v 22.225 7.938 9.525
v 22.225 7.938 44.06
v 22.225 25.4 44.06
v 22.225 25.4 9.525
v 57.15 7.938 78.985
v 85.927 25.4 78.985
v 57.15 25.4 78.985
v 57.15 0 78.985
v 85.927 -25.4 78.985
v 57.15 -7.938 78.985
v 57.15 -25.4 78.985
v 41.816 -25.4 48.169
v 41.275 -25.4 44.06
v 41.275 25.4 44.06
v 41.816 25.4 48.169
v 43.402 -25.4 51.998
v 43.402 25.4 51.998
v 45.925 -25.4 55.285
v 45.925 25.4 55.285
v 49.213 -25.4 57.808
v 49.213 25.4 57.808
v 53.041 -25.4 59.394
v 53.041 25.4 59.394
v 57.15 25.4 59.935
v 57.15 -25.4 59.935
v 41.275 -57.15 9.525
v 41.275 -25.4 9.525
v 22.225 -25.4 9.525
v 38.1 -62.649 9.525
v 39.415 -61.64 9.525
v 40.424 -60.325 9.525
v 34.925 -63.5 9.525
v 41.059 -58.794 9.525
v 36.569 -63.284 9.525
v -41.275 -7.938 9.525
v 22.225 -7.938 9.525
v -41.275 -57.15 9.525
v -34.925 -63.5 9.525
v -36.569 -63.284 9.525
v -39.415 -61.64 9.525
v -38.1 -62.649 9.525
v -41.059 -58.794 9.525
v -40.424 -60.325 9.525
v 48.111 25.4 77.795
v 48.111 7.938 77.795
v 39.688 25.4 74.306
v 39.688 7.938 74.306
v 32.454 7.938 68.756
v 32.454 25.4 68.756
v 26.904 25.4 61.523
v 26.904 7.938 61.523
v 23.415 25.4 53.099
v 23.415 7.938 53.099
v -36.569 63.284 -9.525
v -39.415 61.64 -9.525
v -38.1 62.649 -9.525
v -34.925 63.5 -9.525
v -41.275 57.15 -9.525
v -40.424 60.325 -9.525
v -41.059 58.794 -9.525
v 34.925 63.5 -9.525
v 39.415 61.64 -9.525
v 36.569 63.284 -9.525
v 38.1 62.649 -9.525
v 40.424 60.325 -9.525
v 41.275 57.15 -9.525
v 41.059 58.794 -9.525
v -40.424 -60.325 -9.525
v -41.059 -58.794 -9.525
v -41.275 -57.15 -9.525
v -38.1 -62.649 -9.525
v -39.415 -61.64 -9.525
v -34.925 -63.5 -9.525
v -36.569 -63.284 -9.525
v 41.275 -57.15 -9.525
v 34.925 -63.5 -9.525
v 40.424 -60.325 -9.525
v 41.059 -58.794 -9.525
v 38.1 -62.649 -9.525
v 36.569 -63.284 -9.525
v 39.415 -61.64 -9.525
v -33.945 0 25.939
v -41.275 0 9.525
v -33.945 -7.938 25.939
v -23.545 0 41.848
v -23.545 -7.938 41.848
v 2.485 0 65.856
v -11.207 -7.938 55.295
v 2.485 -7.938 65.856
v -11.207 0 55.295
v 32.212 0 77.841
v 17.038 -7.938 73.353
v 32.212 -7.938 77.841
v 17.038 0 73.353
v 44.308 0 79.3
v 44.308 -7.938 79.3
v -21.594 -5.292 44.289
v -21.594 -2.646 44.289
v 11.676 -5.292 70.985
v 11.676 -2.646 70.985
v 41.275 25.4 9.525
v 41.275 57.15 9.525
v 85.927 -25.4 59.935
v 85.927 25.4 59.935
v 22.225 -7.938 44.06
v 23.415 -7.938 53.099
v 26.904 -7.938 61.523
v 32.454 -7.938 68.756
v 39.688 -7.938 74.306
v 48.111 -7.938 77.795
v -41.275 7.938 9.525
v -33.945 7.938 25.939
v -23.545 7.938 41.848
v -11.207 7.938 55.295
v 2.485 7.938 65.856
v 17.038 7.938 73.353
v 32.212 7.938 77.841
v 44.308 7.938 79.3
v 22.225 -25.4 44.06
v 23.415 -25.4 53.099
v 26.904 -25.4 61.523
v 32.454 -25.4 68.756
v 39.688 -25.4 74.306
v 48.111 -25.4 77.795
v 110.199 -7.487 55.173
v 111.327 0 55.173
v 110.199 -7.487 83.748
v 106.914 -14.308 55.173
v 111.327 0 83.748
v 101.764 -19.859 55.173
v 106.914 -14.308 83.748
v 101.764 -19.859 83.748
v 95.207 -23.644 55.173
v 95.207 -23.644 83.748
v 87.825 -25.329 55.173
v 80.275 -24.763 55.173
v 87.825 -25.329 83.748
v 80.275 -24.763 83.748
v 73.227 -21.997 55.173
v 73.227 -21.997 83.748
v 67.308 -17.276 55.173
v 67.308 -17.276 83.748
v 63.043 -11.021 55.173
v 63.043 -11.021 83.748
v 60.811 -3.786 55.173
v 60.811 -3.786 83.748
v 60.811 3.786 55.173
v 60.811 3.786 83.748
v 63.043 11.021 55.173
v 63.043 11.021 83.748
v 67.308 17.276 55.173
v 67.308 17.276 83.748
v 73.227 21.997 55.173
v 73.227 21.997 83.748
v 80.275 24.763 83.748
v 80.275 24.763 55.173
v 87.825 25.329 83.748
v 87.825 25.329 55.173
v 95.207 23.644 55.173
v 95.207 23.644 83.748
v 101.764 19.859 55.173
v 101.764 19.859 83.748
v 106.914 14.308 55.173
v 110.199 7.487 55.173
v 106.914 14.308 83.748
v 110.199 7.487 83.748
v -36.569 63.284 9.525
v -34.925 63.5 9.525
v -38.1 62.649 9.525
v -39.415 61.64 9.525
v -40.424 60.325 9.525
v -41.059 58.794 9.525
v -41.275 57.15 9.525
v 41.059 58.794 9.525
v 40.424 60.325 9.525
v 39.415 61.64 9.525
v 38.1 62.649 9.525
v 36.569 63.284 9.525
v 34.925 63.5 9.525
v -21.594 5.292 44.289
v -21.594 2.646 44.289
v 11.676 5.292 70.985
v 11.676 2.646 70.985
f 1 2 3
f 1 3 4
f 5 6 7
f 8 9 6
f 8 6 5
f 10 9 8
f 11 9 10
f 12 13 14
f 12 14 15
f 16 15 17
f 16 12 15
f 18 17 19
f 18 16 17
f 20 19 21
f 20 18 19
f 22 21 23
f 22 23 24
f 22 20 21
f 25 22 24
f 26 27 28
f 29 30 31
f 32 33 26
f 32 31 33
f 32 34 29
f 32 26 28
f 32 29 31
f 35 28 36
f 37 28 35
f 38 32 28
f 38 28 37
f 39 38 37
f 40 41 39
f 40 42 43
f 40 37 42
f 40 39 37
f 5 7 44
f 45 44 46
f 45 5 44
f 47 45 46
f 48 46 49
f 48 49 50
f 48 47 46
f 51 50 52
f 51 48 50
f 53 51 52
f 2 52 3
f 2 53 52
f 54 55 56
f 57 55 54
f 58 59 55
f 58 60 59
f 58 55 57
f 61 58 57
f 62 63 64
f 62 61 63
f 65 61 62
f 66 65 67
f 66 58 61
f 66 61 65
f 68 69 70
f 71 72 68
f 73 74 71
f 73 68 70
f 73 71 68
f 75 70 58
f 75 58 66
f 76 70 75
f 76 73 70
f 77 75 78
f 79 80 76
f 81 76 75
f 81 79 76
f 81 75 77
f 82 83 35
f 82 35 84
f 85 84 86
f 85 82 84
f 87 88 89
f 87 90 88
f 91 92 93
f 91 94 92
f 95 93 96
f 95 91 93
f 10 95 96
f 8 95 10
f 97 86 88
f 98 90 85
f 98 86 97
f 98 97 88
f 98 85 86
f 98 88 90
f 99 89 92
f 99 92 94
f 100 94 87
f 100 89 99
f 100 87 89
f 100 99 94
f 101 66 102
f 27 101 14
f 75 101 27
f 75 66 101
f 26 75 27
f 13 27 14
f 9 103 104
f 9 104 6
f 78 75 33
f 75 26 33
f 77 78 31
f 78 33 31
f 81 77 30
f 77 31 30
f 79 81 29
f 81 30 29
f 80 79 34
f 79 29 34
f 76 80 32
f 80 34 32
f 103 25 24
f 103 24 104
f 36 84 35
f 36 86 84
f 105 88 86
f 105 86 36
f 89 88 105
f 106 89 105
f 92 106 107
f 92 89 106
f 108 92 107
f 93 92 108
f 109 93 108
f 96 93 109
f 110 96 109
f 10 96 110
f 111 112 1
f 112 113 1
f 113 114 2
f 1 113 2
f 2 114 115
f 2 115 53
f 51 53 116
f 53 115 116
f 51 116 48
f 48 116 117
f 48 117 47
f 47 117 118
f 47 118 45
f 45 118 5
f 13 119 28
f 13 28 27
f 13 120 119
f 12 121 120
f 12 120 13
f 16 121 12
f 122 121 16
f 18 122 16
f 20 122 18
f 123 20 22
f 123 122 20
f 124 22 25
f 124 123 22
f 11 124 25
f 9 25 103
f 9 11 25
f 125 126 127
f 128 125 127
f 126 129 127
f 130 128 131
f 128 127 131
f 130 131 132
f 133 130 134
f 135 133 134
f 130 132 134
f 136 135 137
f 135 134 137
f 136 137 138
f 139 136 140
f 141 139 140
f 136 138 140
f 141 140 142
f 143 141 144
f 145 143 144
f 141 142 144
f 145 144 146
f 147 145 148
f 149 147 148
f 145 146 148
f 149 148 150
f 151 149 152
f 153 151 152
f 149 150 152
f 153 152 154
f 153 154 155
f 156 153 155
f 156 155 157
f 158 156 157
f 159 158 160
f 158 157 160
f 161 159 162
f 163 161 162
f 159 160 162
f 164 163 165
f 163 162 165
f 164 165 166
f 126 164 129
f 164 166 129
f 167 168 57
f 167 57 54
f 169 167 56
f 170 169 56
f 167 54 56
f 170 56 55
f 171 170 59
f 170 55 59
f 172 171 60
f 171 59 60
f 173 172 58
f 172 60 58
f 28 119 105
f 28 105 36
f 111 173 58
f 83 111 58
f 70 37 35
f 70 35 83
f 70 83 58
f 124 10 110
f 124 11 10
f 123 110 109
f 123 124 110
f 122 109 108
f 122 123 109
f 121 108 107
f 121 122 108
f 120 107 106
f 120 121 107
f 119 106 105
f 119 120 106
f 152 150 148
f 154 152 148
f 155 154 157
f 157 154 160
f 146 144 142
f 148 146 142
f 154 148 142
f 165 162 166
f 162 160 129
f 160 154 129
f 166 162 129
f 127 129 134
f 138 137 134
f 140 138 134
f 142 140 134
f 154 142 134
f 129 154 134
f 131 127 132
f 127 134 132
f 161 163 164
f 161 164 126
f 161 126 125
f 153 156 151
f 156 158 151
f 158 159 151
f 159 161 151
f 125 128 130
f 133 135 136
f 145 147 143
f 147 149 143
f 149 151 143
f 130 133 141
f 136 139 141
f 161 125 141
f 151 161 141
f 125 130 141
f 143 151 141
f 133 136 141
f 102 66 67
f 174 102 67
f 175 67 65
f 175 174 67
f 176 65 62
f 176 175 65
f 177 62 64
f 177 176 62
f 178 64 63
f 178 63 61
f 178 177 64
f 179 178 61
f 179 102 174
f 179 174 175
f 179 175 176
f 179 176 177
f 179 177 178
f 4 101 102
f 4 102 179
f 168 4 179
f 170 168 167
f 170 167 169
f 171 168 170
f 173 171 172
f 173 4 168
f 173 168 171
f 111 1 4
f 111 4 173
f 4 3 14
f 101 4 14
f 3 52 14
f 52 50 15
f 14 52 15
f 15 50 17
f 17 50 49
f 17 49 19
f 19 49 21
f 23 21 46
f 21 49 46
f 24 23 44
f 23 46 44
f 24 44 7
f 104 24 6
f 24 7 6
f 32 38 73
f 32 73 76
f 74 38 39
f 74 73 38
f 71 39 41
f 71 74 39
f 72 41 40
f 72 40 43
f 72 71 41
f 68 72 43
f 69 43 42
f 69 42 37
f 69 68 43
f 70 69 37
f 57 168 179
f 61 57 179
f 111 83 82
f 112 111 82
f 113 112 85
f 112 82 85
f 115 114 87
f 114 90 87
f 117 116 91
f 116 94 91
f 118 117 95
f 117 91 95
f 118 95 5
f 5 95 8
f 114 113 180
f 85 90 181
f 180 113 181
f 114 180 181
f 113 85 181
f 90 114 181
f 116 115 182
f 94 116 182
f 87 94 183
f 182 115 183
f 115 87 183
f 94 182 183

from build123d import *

# Parameters (mm, degrees)
F1_DEPTH = 63.5
F0_W     = 25.4
F0_H     = 19.05
F2_DEPTH = 25.4
F3_DEPTH = 7.9375
F5_R     = 6.35


with BuildPart() as f1:
    # F0 (on Front) → F1 (new body, symmetric)
    with BuildSketch(Plane.XZ):
        Polygon((41.275, -9.525), (41.275, 9.525), (22.225, 9.525), (-41.275, 9.525), (-41.275, -9.525), align=None)
    extrude(amount=F1_DEPTH, both=True)

    # F0 (on Front) → F2 (join, symmetric)
    with BuildSketch(Plane.XZ):
        with BuildLine():
            Line((22.225, 9.525), (41.275, 9.525))
            Line((41.275, 9.525), (41.275, 44.0600354195))
            ThreePointArc((41.275, 44.0600354195), (45.9246798487, 55.2853555708), (57.15, 59.9350354195))
            Line((57.15, 59.9350354195), (60.5272703528, 59.9350354195))
            Line((60.5272703528, 59.9350354195), (60.5272703528, 78.9850354195))
            Line((60.5272703528, 78.9850354195), (57.15, 78.9850354195))
            ThreePointArc((57.15, 78.9850354195), (32.4542956671, 68.7557397524), (22.225, 44.0600354195))
            Line((22.225, 44.0600354195), (22.225, 9.525))
        make_face()
        with Locations((73.2272703528, 69.4600354195)):
            Rectangle(F0_W, F0_H)
    extrude(amount=F2_DEPTH, both=True)

    # F0 (on Front) → F3 (join, symmetric)
    with BuildSketch(Plane.XZ):
        with BuildLine():
            Line((-41.275, 9.525), (22.225, 9.525))
            Line((22.225, 9.525), (22.225, 44.0600354195))
            ThreePointArc((22.225, 44.0600354195), (32.4542956671, 68.7557397524), (57.15, 78.9850354195))
            add(Edge.make_bspline(
                [(-41.275, 9.525), (-28.850948438, 44.7817482054), (6.0363649391, 83.8745053786), (57.15, 78.9850354195)],
                knots=[0, 0, 0, 0, 120.4664980211, 120.4664980211, 120.4664980211, 120.4664980211], degree=3))
        make_face()
    extrude(amount=F3_DEPTH, both=True)

    # F5
    f5_edges = [f1.edges().sort_by_distance(p)[0] for p in [
        (41.275, -63.5, 0),
        (-41.275, -63.5, 0),
        (-41.275, 63.5, 0),
        (41.275, 63.5, 0),
    ]]
    fillet(f5_edges, radius=F5_R)


with BuildPart() as f4:
    # F0 (on Front) → F4 (revolve)
    with BuildSketch(Plane.XZ):
        Polygon((85.9272703528, 78.9850354195), (85.9272703528, 59.9350354195), (85.9272703528, 55.1725354195), (111.3272703528, 55.1725354195), (111.3272703528, 83.7475354195), (85.9272703528, 83.7475354195), align=None)
    revolve(axis=Axis((85.9272703528, 0, 69.4600354195), (0, 0, -1)))


solid = Compound([f1.part, f4.part])
